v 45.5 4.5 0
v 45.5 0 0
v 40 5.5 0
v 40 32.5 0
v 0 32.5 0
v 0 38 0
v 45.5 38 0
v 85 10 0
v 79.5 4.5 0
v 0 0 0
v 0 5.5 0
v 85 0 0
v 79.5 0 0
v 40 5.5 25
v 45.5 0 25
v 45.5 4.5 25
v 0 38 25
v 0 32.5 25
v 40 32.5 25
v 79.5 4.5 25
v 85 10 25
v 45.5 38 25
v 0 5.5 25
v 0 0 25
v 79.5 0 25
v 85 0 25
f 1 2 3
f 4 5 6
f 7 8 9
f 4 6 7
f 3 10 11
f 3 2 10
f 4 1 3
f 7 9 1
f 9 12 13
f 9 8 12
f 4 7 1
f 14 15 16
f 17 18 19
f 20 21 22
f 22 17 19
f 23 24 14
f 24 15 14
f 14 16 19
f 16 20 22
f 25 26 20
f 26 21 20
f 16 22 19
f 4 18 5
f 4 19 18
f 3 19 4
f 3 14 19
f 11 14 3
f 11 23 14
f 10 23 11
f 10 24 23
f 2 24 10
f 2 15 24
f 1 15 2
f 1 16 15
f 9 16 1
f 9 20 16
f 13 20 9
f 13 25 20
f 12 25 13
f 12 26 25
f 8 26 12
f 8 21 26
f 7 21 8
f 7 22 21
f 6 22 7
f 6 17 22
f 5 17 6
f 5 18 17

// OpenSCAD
// preview[view:north, tilt:top]

/* [Table] */
// How thick is your table plate?
table_thickness = 27; // [5:50]

/* [Headphone] */
// How height is your Headphones bracket?
headphone_height = 4.5;
// How width is your Headphones bracket?
headphone_widht = 34;

/* [Hidden] */
holder_width = 25;
holder_thikness = 5.5;
holder_lenght = 40;

// Print HeadPhone Holder
HeadPholeHolder();

module HeadPholeHolder(){
    linear_extrude(height = holder_width){
        HeadPholeHolderSideView();
    }
}

module HeadPholeHolderSideView(){
    difference(){
        square ([holder_lenght, holder_thikness * 2 + table_thickness]);
        translate([0, holder_thikness])
            square ([holder_lenght, table_thickness]);
    }
    difference(){
        translate([holder_lenght, 0]){
            square([holder_thikness, holder_thikness * 2 + table_thickness]);
            square([holder_thikness * 2 + headphone_widht, headphone_height + holder_thikness]);
        }
        translate([holder_lenght + holder_thikness, 0]){
            square([headphone_widht, headphone_height]);
        }
    }
    polygon(points=[[holder_lenght + holder_thikness, headphone_height + holder_thikness], 
        [holder_lenght + 2 * holder_thikness + headphone_widht, headphone_height + holder_thikness], 
        [holder_lenght + holder_thikness, holder_thikness * 2 + table_thickness]]);
}
